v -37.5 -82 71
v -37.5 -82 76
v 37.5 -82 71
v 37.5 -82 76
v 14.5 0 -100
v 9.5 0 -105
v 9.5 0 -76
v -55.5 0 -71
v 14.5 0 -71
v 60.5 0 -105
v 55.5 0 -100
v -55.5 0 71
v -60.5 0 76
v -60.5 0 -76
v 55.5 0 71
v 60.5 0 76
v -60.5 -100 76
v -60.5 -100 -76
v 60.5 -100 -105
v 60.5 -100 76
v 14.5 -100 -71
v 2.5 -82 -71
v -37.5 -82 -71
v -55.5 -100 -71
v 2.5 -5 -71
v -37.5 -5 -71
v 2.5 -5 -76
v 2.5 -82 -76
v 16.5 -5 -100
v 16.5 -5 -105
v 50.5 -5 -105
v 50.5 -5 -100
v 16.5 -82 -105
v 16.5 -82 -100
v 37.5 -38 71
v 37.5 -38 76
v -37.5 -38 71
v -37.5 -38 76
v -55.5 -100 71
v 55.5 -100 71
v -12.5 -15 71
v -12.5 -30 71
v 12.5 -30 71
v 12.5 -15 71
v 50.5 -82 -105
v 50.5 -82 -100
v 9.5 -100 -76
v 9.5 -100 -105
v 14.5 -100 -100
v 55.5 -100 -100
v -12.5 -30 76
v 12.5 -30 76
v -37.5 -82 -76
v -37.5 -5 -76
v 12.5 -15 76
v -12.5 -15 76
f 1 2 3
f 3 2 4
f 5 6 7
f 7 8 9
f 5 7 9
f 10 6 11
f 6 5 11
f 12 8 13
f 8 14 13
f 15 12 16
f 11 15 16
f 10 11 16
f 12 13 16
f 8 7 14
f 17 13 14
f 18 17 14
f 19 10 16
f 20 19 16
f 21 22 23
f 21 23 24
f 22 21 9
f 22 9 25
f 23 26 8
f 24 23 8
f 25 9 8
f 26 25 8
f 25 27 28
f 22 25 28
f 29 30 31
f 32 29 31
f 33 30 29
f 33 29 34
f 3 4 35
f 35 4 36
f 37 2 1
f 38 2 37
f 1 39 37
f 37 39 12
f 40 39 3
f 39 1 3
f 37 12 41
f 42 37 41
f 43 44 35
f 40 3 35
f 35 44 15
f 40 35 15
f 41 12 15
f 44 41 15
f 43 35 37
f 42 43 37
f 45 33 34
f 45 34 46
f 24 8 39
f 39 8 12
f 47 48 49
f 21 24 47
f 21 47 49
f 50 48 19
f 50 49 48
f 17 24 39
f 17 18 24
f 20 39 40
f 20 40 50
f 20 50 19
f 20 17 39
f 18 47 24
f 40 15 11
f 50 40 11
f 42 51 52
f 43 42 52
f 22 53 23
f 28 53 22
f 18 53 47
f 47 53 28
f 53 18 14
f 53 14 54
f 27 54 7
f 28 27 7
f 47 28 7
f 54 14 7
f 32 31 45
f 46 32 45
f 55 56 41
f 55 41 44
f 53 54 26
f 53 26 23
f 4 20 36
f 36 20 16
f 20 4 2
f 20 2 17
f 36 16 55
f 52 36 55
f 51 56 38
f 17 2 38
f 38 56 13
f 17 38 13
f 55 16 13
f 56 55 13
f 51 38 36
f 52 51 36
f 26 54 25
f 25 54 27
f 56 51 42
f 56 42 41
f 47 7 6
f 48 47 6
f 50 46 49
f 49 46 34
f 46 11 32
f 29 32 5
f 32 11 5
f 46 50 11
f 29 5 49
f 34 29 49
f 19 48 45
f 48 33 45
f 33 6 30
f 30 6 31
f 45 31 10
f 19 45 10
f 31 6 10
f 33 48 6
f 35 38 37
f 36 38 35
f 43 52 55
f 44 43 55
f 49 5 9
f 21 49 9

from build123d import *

# Parameters (mm, degrees)
F0_W      = 5
F0_H      = 142
F0_H_2    = 24
F1_DEPTH  = 100
F2_W      = 75
F2_H      = 44
F3_DEPTH  = 25
F4_W      = 34
F4_H      = 77
F5_DEPTH  = 25
F7_W      = 40
F7_H      = 77
F8_DEPTH  = 25
F9_W      = 25
F9_H      = 15
F10_DEPTH = 25


with BuildPart() as f1:
    # F0 (on Front) → F1 (new body)
    with BuildSketch(Plane.XZ):
        with Locations((-58, 0)):
            Rectangle(F0_W, F0_H)
        Polygon((-60.5, 71), (-55.5, 71), (55.5, 71), (60.5, 71), (60.5, 76), (-60.5, 76), align=None)
        Polygon((14.5, -71), (-55.5, -71), (-60.5, -71), (-60.5, -76), (9.5, -76), (14.5, -76), align=None)
        Polygon((60.5, 71), (55.5, 71), (55.5, -100), (55.5, -105), (60.5, -105), align=None)
        Polygon((55.5, -105), (55.5, -100), (14.5, -100), (9.5, -100), (9.5, -105), align=None)
        with Locations((12, -88)):
            Rectangle(F0_W, F0_H_2)
    extrude(amount=F1_DEPTH)

    # F2 (on face) → F3 (cut)
    with BuildSketch(Plane.XY.offset(76)):
        with Locations((0, -60)):
            Rectangle(F2_W, F2_H)
    extrude(amount=-F3_DEPTH, mode=Mode.SUBTRACT)

    # F4 (on face) → F5 (cut)
    with BuildSketch(Plane(origin=(0, 0, -105), x_dir=(1, 0, 0), z_dir=(0, 0, -1))):
        with Locations((33.5, 43.5)):
            Rectangle(F4_W, F4_H)
    extrude(amount=-F5_DEPTH, mode=Mode.SUBTRACT)

    # F7 (on face) → F8 (cut)
    with BuildSketch(Plane(origin=(0, 0, -76), x_dir=(1, 0, 0), z_dir=(0, 0, -1))):
        with Locations((-17.5, 43.5)):
            Rectangle(F7_W, F7_H)
    extrude(amount=-F8_DEPTH, mode=Mode.SUBTRACT)

    # F9 (on face) → F10 (cut)
    with BuildSketch(Plane.XY.offset(76)):
        with Locations((0, -22.5)):
            Rectangle(F9_W, F9_H)
    extrude(amount=-F10_DEPTH, mode=Mode.SUBTRACT)


solid = f1.part
